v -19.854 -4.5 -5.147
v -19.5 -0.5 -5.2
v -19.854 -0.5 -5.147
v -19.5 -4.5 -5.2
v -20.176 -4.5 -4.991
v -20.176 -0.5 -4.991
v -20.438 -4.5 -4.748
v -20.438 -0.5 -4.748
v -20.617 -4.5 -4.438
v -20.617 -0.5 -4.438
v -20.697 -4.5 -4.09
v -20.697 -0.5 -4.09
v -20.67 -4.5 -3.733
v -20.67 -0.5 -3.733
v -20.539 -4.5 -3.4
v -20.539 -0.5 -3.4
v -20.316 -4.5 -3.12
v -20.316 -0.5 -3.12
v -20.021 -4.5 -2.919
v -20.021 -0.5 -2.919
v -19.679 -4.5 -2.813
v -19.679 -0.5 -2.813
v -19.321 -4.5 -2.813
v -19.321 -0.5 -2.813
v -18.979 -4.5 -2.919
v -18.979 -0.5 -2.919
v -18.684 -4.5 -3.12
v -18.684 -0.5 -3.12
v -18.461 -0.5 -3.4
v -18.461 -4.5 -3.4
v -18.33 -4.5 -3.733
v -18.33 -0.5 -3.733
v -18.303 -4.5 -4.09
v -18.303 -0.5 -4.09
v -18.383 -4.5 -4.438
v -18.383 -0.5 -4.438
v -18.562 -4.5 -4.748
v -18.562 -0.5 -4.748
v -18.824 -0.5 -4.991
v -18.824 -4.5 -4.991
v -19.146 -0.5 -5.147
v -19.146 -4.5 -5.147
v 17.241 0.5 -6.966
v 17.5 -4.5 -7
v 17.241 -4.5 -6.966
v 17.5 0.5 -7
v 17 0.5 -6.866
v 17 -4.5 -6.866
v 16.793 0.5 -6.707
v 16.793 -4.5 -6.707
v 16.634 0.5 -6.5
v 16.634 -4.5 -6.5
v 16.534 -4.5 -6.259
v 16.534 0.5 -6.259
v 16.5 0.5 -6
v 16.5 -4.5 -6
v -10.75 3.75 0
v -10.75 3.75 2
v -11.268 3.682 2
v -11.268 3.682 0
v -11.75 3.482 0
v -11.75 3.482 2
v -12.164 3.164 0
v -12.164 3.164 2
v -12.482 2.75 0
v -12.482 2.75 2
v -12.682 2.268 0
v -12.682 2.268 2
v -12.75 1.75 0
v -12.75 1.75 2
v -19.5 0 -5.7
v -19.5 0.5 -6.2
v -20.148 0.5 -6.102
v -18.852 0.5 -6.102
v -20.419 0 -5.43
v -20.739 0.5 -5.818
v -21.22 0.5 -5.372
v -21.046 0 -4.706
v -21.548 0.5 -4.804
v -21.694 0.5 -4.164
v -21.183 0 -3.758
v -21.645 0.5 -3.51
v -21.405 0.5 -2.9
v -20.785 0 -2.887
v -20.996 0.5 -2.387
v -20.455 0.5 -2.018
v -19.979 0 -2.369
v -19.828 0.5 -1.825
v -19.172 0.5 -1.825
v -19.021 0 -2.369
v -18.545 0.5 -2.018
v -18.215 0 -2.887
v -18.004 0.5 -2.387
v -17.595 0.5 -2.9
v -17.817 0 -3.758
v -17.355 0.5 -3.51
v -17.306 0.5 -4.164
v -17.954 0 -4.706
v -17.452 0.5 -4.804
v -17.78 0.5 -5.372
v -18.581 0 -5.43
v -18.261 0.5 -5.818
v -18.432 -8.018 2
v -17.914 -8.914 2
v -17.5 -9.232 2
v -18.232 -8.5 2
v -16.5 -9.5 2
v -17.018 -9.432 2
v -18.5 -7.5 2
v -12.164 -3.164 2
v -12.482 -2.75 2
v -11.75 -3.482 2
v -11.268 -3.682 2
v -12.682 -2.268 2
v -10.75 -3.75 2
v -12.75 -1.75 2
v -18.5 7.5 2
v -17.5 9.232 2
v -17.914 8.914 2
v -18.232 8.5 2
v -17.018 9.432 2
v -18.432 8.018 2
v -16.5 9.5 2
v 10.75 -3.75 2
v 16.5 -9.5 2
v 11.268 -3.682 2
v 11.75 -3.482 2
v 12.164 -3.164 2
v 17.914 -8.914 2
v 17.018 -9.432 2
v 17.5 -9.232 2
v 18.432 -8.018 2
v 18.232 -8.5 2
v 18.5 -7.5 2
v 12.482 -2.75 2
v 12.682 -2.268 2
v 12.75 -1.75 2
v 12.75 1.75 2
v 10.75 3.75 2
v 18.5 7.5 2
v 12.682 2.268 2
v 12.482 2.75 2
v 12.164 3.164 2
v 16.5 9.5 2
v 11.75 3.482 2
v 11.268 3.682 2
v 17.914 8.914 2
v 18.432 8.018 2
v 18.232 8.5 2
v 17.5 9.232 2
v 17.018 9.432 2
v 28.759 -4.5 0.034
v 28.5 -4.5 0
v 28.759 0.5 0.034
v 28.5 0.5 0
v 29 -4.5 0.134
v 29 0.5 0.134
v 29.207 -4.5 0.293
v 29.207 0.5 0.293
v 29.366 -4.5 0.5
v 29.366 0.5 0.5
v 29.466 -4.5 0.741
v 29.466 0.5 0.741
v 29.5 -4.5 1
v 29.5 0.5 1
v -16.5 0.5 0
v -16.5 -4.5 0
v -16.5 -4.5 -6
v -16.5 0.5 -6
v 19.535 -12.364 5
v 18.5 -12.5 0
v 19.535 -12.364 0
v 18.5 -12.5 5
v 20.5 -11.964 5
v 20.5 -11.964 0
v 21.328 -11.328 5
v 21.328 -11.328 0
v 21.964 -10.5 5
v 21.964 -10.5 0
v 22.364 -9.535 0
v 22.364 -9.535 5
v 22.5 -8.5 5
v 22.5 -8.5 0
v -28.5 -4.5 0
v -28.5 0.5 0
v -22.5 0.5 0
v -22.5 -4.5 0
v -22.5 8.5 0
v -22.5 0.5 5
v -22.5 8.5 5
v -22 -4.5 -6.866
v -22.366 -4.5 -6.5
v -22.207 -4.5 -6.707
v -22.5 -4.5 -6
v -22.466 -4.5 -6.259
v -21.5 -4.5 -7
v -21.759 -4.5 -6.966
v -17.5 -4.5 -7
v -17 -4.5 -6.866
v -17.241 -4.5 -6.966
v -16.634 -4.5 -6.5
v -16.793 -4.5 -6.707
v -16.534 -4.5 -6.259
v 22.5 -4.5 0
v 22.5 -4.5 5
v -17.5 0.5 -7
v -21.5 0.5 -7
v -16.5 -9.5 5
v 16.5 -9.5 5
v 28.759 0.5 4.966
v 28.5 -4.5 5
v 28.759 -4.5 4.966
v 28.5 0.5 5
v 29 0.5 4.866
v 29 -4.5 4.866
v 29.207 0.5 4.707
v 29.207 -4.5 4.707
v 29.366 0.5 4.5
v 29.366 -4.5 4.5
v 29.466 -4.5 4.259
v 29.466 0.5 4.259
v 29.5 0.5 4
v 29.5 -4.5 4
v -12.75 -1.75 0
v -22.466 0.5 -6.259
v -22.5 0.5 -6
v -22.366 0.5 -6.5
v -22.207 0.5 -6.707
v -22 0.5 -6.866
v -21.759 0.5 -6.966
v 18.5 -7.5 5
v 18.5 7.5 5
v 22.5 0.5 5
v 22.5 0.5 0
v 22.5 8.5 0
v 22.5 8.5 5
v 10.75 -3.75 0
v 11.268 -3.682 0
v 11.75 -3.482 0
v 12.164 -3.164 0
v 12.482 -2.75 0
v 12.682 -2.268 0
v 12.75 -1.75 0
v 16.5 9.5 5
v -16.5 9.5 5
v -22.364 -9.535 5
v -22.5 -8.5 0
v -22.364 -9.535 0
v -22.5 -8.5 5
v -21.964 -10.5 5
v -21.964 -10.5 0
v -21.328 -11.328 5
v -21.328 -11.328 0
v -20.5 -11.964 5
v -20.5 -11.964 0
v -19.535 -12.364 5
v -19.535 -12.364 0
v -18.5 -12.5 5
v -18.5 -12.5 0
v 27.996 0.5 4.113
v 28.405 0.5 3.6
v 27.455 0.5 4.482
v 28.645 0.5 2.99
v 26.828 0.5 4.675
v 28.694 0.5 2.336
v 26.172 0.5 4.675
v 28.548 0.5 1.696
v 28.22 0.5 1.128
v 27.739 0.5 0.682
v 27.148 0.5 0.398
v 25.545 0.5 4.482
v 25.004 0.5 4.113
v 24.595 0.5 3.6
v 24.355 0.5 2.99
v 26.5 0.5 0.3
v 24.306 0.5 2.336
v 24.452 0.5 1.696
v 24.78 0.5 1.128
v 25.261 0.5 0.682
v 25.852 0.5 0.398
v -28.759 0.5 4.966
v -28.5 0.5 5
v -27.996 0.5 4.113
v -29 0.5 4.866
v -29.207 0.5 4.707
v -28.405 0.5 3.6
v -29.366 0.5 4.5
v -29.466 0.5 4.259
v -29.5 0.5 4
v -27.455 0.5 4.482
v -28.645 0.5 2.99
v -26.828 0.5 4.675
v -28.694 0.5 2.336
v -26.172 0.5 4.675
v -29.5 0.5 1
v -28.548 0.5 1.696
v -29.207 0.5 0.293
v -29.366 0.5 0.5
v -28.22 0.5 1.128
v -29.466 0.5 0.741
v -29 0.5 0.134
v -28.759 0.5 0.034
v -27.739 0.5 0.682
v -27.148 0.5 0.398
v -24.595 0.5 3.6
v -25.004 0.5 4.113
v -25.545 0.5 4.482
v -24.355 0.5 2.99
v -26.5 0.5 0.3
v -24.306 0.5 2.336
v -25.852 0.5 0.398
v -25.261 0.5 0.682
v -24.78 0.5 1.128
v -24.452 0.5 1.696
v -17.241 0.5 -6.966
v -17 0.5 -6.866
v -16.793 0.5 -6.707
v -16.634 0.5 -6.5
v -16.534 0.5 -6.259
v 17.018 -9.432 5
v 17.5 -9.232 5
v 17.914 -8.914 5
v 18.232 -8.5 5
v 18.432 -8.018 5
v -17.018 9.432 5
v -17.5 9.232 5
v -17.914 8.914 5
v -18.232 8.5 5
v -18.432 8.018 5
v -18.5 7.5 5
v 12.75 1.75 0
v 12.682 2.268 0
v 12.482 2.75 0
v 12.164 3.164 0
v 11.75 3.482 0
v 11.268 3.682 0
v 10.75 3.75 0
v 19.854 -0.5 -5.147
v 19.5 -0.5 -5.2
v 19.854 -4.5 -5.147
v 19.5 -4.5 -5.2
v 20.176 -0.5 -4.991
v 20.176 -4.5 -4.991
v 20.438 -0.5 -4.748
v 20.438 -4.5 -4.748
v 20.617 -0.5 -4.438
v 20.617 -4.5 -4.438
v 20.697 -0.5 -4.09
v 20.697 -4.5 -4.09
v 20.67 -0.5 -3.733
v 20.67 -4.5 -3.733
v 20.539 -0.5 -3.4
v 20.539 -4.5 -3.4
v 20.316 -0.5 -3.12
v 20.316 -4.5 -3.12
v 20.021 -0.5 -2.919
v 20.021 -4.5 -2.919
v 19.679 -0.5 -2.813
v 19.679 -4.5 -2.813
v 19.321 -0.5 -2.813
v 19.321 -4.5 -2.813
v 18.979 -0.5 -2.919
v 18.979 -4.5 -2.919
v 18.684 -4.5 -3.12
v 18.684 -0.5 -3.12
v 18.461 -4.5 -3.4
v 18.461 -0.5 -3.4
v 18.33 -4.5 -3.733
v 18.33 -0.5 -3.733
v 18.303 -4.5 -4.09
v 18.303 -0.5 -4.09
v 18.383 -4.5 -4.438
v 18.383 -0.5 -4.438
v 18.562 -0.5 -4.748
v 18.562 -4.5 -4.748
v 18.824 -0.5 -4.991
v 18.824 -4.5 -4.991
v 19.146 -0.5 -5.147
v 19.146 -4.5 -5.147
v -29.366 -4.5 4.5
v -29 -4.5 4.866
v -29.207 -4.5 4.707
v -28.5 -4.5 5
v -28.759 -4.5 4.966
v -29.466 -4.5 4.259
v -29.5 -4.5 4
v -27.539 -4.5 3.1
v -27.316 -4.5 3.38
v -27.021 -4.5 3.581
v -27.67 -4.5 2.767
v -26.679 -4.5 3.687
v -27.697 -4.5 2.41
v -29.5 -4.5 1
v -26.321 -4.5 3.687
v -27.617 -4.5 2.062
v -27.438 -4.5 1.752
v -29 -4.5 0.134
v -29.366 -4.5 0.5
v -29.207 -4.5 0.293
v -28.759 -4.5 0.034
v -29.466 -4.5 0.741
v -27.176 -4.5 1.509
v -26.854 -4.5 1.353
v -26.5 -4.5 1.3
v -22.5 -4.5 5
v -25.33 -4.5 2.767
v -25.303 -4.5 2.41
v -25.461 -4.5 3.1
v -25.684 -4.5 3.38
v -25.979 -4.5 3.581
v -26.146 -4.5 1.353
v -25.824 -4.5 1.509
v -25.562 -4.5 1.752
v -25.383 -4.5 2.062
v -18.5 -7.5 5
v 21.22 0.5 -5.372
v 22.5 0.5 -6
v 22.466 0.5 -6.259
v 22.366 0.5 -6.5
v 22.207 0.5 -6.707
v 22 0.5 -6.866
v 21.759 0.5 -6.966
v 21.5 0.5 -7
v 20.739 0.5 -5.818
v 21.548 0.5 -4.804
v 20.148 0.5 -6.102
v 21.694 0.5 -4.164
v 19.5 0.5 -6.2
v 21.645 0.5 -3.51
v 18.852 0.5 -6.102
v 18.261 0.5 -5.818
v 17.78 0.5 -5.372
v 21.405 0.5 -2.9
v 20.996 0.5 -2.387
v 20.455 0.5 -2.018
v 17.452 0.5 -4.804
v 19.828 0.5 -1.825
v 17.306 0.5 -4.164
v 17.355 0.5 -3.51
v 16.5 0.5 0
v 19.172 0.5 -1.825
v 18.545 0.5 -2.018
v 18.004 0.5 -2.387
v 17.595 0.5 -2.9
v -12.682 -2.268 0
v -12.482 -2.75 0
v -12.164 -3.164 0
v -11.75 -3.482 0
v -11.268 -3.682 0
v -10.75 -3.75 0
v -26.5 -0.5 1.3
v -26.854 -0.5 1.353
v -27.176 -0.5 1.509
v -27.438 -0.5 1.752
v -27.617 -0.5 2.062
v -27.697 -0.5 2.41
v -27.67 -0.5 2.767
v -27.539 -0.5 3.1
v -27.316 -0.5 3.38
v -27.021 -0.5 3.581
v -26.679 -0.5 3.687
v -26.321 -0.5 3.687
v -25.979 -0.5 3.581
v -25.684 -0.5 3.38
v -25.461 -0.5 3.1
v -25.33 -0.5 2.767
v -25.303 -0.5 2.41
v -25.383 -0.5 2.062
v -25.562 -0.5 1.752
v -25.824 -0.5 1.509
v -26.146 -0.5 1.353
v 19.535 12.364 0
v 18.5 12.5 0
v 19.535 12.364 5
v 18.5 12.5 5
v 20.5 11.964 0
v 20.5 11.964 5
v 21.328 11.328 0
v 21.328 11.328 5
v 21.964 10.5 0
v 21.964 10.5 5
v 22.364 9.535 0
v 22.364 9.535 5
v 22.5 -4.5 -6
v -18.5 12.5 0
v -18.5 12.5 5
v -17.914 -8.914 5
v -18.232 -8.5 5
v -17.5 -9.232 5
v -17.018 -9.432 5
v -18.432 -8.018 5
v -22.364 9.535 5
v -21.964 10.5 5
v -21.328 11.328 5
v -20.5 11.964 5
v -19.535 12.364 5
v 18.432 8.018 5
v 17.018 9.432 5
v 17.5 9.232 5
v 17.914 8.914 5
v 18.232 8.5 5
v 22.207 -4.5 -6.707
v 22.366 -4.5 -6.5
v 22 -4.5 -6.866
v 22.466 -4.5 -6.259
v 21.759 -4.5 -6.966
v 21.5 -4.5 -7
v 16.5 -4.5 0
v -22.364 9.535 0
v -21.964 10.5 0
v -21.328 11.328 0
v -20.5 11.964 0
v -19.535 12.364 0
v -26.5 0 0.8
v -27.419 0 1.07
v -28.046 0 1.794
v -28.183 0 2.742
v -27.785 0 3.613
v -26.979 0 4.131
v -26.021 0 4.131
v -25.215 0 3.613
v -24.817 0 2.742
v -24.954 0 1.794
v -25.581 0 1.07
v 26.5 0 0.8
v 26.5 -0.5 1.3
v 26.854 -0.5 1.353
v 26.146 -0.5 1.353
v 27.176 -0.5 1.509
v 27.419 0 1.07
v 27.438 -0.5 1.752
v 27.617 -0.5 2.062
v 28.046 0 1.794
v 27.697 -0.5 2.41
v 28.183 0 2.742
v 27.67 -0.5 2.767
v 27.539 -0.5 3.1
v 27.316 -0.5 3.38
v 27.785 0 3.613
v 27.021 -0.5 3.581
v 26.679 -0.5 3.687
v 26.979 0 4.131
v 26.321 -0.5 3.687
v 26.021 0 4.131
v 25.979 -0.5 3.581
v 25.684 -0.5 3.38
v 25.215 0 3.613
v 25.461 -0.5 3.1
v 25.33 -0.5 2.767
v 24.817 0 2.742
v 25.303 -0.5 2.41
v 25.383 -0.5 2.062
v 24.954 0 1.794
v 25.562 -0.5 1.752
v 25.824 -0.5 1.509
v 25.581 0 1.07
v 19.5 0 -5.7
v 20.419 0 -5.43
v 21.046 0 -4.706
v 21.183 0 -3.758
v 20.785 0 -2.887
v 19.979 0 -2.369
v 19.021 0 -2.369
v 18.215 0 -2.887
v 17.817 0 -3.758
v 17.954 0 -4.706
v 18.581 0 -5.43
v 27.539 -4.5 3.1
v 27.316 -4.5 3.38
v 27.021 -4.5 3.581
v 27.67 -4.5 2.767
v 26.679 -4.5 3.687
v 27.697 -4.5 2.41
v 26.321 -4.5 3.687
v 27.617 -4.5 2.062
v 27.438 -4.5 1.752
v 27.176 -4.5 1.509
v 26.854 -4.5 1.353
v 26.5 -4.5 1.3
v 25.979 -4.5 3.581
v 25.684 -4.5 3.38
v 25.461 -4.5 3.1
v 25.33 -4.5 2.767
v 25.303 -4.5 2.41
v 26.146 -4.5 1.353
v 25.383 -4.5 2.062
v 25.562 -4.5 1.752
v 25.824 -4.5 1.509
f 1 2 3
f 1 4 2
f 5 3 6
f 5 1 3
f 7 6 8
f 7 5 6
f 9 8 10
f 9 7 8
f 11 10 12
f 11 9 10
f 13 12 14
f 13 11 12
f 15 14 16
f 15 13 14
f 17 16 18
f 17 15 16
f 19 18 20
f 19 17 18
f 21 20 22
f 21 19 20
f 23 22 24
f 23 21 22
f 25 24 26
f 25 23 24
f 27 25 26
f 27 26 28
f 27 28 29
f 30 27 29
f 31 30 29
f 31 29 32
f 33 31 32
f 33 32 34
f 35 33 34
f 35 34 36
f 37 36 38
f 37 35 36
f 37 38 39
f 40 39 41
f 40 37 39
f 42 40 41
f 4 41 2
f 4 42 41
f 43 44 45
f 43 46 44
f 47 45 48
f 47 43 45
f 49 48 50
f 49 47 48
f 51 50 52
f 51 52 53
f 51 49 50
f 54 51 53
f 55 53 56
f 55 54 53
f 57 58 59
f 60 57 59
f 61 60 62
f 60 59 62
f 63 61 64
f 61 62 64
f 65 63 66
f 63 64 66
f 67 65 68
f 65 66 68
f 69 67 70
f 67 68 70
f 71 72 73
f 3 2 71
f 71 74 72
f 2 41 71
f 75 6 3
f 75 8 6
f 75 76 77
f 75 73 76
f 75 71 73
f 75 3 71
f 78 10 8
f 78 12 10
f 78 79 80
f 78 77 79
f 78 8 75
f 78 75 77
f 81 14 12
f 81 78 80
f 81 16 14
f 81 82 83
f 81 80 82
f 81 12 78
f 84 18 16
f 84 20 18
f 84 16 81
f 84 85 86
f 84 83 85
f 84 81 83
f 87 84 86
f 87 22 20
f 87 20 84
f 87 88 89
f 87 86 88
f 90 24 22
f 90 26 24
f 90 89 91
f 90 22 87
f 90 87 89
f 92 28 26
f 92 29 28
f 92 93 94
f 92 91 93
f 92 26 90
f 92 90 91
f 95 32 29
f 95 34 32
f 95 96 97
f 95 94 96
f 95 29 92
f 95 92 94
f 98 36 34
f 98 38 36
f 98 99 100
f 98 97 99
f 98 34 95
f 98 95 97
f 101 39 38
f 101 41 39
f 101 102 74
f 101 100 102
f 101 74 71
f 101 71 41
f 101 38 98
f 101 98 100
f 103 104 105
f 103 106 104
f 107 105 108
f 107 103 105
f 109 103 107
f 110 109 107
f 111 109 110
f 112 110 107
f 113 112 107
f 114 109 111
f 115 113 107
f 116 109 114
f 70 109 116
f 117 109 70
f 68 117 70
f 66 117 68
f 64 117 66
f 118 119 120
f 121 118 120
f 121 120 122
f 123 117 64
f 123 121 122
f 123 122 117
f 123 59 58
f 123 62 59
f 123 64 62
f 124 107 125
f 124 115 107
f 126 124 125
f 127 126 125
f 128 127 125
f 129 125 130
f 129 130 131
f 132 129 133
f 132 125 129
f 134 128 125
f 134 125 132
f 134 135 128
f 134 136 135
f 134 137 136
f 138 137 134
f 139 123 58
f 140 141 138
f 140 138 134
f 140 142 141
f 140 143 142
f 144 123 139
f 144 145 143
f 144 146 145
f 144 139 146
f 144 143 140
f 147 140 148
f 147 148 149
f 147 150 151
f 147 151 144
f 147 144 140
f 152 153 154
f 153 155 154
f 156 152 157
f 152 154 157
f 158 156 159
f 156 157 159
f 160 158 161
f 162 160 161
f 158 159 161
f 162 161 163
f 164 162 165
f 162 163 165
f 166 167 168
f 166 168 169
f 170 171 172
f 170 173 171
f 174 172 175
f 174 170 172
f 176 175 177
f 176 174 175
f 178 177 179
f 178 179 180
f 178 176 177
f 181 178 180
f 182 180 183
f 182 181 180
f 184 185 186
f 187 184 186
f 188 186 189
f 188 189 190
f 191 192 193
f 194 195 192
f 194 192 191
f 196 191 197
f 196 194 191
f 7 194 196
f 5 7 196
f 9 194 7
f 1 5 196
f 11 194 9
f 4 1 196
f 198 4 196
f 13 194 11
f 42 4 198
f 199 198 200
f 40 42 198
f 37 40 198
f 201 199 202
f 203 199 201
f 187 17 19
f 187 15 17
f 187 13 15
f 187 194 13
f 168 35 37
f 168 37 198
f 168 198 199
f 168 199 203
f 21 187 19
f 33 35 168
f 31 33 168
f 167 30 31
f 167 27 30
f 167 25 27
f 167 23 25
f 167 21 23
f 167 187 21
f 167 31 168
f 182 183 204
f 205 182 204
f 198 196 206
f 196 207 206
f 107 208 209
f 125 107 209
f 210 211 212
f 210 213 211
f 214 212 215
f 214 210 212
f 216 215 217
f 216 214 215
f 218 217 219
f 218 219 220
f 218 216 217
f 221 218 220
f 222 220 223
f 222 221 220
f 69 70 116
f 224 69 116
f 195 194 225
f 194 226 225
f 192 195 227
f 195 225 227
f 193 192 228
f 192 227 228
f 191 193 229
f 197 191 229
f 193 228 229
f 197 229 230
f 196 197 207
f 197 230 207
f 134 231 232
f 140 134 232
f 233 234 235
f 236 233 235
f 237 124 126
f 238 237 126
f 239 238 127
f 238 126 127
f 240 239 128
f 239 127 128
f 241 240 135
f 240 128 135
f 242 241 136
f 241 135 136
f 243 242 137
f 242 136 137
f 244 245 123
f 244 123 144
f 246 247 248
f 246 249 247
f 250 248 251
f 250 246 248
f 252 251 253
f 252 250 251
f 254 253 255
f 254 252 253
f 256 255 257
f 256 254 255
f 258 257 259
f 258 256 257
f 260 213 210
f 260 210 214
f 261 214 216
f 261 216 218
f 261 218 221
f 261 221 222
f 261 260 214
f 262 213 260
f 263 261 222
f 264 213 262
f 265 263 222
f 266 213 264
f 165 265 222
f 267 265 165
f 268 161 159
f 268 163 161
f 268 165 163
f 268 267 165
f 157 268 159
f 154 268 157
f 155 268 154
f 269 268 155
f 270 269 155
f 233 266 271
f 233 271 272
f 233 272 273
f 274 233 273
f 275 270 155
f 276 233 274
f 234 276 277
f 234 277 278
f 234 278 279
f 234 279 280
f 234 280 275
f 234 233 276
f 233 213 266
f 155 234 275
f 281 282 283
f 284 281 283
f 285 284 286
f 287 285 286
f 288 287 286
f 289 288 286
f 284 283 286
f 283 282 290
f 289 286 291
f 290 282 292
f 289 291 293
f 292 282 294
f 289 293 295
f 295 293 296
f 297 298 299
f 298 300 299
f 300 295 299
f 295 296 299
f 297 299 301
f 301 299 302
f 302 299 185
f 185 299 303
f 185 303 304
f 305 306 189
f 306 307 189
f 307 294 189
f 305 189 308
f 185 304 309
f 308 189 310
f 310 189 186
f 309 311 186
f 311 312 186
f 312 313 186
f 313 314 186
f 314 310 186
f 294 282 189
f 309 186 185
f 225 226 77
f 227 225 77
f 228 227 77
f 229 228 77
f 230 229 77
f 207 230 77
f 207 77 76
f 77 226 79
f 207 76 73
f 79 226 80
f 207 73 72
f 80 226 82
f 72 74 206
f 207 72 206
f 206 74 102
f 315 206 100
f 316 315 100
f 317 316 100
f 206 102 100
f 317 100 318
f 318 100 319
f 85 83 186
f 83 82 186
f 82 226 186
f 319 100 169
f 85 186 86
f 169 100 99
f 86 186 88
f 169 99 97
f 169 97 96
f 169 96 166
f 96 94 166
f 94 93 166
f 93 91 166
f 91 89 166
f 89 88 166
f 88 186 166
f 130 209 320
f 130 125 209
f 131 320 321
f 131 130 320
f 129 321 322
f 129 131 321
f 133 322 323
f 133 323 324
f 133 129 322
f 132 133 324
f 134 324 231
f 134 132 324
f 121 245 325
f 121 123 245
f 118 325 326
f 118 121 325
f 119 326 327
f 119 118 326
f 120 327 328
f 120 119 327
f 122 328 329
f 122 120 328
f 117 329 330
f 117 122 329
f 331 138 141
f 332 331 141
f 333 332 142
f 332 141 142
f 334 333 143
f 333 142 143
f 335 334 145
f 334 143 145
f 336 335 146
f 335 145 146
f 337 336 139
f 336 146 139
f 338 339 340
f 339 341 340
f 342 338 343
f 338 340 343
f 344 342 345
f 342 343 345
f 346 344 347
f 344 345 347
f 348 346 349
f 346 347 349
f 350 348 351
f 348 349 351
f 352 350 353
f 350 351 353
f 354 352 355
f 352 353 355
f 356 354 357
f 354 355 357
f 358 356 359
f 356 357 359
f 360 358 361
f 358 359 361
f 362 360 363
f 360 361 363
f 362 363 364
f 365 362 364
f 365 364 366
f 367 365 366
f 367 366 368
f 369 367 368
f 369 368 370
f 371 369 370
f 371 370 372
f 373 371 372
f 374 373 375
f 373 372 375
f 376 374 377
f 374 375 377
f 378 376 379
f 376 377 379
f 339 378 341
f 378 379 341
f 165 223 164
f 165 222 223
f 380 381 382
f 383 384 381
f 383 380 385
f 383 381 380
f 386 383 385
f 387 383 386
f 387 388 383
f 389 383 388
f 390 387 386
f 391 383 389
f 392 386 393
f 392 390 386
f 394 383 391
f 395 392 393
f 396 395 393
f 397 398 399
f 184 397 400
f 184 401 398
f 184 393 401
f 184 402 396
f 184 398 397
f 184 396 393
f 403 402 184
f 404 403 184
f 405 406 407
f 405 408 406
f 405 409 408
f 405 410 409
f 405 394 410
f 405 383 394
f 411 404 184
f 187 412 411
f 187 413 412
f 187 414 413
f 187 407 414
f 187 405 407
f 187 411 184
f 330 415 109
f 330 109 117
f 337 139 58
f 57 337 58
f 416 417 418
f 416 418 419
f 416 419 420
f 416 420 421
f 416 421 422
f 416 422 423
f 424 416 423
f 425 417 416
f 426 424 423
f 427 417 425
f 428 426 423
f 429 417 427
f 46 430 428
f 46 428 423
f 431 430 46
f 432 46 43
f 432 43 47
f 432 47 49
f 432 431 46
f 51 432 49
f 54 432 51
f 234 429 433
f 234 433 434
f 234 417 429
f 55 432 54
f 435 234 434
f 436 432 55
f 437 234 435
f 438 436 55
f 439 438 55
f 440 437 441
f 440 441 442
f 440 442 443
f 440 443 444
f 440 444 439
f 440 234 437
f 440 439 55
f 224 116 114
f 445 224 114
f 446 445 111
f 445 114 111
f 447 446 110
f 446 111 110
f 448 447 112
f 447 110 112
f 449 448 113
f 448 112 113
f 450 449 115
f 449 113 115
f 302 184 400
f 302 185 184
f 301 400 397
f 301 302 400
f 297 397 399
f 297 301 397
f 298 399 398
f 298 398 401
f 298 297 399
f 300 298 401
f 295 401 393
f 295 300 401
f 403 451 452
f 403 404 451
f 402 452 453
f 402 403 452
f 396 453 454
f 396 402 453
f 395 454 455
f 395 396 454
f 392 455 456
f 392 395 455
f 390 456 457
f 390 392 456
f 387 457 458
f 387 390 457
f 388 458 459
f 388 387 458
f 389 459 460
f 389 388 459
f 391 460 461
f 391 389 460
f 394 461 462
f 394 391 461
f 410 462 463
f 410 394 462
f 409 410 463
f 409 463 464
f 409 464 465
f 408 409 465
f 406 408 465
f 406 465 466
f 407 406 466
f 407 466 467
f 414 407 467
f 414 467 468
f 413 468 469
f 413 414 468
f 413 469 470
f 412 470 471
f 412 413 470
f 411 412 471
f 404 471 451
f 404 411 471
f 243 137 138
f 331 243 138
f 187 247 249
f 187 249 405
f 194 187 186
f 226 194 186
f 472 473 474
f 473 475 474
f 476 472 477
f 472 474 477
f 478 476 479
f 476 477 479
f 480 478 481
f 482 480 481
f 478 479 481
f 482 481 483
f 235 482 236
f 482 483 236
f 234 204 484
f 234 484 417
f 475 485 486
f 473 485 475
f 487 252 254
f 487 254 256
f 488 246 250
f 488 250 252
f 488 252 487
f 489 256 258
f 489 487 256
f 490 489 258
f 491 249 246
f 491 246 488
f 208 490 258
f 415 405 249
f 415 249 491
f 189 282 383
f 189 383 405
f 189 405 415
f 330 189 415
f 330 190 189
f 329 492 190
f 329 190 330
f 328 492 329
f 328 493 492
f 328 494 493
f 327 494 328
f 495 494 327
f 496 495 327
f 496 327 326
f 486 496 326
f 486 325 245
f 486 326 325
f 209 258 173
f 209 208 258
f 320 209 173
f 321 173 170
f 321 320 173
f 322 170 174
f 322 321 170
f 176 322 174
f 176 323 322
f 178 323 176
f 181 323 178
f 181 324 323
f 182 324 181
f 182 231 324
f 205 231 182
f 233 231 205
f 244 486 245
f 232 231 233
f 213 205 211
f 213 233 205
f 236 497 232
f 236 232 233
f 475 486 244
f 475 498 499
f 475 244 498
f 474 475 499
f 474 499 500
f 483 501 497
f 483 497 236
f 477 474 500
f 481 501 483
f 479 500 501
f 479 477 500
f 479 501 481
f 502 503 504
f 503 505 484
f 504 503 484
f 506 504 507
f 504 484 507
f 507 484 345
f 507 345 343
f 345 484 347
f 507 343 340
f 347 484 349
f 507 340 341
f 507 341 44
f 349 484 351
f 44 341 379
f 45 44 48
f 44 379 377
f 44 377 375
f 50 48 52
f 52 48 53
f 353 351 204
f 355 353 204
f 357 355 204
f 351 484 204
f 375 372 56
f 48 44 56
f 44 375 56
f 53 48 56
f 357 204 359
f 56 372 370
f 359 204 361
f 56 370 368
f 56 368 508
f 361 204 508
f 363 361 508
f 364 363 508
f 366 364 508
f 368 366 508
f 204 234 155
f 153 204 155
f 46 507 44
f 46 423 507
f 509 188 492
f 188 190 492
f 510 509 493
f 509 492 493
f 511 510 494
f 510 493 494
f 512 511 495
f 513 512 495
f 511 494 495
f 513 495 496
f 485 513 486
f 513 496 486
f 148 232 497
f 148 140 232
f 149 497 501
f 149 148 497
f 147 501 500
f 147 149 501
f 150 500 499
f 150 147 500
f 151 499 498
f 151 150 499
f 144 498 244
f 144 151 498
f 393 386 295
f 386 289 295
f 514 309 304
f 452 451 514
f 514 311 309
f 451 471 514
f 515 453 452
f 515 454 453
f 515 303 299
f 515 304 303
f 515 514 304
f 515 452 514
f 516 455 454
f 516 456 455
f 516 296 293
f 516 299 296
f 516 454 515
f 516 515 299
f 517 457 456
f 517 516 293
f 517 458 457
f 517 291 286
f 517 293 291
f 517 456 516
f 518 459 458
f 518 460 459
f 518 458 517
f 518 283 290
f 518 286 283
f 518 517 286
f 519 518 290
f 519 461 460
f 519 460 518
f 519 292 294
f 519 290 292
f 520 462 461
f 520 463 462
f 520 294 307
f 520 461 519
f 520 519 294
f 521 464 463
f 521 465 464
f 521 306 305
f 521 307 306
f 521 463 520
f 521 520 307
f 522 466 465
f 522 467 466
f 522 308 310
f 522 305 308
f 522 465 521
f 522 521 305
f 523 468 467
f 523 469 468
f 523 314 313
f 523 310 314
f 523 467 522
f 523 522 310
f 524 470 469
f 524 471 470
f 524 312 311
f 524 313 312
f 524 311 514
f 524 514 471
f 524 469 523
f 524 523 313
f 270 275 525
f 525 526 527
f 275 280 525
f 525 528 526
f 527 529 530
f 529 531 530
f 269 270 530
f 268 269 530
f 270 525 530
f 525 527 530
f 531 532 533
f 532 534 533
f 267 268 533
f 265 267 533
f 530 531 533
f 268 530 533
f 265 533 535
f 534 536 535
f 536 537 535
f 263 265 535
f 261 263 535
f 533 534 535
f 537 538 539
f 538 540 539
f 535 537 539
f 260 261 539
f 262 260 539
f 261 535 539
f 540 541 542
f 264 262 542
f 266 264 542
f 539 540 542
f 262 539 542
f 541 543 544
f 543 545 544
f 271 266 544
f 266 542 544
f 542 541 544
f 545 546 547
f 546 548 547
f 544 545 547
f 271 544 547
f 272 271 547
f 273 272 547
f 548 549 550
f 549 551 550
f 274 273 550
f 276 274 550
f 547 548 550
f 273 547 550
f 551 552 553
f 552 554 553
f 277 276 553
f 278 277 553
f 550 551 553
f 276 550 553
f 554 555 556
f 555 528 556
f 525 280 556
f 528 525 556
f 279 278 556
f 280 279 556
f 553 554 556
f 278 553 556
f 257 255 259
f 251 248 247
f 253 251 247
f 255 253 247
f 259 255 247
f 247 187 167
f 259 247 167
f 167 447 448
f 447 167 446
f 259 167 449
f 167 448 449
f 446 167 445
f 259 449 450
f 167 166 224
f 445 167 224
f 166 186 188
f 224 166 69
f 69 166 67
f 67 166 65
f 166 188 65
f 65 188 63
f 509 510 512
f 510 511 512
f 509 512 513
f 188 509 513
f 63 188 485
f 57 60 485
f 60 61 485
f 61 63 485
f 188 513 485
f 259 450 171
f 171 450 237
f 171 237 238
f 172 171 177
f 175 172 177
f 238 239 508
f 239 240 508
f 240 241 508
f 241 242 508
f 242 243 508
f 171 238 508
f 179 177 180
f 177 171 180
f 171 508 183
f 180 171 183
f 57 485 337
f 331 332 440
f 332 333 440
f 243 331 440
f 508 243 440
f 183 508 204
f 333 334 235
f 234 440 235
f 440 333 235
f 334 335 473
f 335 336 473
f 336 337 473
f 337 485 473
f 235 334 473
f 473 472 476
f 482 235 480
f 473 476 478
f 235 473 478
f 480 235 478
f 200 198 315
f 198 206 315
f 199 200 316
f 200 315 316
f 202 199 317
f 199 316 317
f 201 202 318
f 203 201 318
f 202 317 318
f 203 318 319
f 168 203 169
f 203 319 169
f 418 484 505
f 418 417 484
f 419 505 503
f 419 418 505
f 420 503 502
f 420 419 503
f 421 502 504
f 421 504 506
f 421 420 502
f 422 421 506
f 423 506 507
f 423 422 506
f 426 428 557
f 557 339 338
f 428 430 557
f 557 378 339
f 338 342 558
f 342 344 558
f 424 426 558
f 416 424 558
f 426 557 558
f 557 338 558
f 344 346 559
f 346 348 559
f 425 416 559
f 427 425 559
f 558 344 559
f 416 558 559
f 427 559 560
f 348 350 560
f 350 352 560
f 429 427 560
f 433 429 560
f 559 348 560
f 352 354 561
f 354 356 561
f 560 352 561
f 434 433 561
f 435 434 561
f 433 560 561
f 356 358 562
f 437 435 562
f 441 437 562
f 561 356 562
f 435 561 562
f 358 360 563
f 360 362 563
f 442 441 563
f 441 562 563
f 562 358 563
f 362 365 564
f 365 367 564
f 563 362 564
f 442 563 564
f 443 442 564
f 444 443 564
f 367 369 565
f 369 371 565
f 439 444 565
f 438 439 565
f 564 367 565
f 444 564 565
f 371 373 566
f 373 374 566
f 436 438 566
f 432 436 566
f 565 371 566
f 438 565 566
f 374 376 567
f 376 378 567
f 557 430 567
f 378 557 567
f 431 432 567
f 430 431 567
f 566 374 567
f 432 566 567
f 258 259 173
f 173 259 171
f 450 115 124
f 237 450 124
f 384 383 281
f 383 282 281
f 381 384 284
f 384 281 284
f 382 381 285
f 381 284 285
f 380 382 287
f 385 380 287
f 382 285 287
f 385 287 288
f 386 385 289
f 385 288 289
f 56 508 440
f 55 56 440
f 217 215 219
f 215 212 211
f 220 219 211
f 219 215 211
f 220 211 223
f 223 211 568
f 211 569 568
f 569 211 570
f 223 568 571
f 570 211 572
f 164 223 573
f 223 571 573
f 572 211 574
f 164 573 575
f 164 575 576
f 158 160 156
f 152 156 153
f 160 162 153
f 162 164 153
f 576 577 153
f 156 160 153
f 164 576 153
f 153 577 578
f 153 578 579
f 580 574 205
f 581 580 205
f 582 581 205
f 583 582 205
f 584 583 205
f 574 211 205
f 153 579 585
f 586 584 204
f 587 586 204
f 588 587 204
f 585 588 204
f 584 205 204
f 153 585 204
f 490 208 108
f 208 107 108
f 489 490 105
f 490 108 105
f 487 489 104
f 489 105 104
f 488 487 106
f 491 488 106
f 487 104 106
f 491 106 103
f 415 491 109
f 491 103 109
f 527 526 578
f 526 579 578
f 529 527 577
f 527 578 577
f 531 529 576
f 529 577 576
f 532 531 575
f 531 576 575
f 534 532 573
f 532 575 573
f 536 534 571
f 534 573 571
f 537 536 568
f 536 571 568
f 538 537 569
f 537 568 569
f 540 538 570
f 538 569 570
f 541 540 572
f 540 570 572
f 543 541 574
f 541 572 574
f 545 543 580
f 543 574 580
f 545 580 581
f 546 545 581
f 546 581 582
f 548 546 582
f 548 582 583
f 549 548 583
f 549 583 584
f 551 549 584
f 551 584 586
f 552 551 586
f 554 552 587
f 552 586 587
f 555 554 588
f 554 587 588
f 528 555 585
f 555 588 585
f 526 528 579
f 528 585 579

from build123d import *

# Parameters (mm, degrees)
SKETCH1_W                                       = 45
SKETCH1_H                                       = 25
BOSS_EXTRUDE1_DEPTH                             = 5
SKETCH2_W                                       = 37
SKETCH2_H                                       = 19
CUT_EXTRUDE1_DEPTH                              = 3
FILLET1_R                                       = 2
CUT_EXTRUDE2_DEPTH                              = 26.91331704
FILLET2_R                                       = 4
SKETCH4_W                                       = 5
SKETCH4_H                                       = 5
BOSS_EXTRUDE2_DEPTH                             = 7
CSK_FOR_M2_FLAT_HEAD_MACHINE_SCREW1_D           = 2.4
CSK_FOR_M2_FLAT_HEAD_MACHINE_SCREW1_CSINK_D     = 4.4
CSK_FOR_M2_FLAT_HEAD_MACHINE_SCREW1_CSINK_ANGLE = 90
FILLET3_R                                       = 1
FILLET3_OF_MIRROR1_R                            = 1
SKETCH8_W                                       = 6
SKETCH8_H                                       = 5
BOSS_EXTRUDE3_DEPTH                             = 7
CSK_FOR_M2_FLAT_HEAD_MACHINE_SCREW2_D           = 2.4
CSK_FOR_M2_FLAT_HEAD_MACHINE_SCREW2_CSINK_D     = 4.4
CSK_FOR_M2_FLAT_HEAD_MACHINE_SCREW2_CSINK_ANGLE = 90
FILLET4_R                                       = 1
FILLET4_OF_MIRROR2_R                            = 1


with BuildPart() as part:
    # Sketch1 → Boss-Extrude1 (new body)
    with BuildSketch(Plane.XY):
        Rectangle(SKETCH1_W, SKETCH1_H)
    extrude(amount=BOSS_EXTRUDE1_DEPTH)

    # Sketch2 → Cut-Extrude1 (cut)
    with BuildSketch(Plane.XY.offset(5)):
        Rectangle(SKETCH2_W, SKETCH2_H)
    extrude(amount=-CUT_EXTRUDE1_DEPTH, mode=Mode.SUBTRACT)

    # Fillet1
    fillet1_edges = [part.edges().sort_by_distance(p)[0] for p in [
        (18.5, 9.5, 3.5),
        (18.5, -9.5, 3.5),
        (-18.5, -9.5, 3.5),
        (-18.5, 9.5, 3.5),
    ]]
    fillet(fillet1_edges, radius=FILLET1_R)

    # Sketch3 → Cut-Extrude2 (cut, through all)
    with BuildSketch(Plane.XY.offset(2)):
        with BuildLine():
            Line((-10.75, -3.75), (10.75, -3.75))
            ThreePointArc((10.75, -3.75), (12.164213562, -3.164213562), (12.75, -1.75))
            Line((12.75, -1.75), (12.75, 1.75))
            ThreePointArc((12.75, 1.75), (12.164213562, 3.164213562), (10.75, 3.75))
            Line((10.75, 3.75), (-10.75, 3.75))
            ThreePointArc((-10.75, 3.75), (-12.164213562, 3.164213562), (-12.75, 1.75))
            Line((-12.75, 1.75), (-12.75, -1.75))
            ThreePointArc((-12.75, -1.75), (-12.164213562, -3.164213562), (-10.75, -3.75))
        make_face()
    extrude(amount=-CUT_EXTRUDE2_DEPTH, mode=Mode.SUBTRACT)

    # Fillet2
    fillet2_edges = [part.edges().sort_by_distance(p)[0] for p in [
        (22.5, -12.5, 2.5),
        (-22.5, -12.5, 2.5),
        (-22.5, 12.5, 2.5),
        (22.5, 12.5, 2.5),
    ]]
    fillet(fillet2_edges, radius=FILLET2_R)

    # Sketch4 → Boss-Extrude2 (add)
    with BuildSketch(Plane(origin=(22.5, 0, 0), x_dir=(0, 0, -1), z_dir=(1, 0, 0))):
        with Locations((-2.5, -2)):
            Rectangle(SKETCH4_W, SKETCH4_H)
    boss_extrude2 = extrude(amount=BOSS_EXTRUDE2_DEPTH)

    # CSK for M2 Flat Head Machine Screw1 (through all)
    with Locations(Plane(origin=(26.5, 0.5, 2.5), x_dir=(0, 0, 1), z_dir=(0, 1, 0))):
        with Locations((0, 0)):
            csk_for_m2_flat_head_machine_screw1 = CounterSinkHole(CSK_FOR_M2_FLAT_HEAD_MACHINE_SCREW1_D / 2, CSK_FOR_M2_FLAT_HEAD_MACHINE_SCREW1_CSINK_D / 2, counter_sink_angle=CSK_FOR_M2_FLAT_HEAD_MACHINE_SCREW1_CSINK_ANGLE)

    # Fillet3
    fillet3_edges = [part.edges().sort_by_distance(p)[0] for p in [
        (29.5, -2, 5),
        (29.5, -2, 0),
    ]]
    fillet(fillet3_edges, radius=FILLET3_R)

    # Mirror1: Boss-Extrude2, CSK for M2 Flat Head Machine Screw1 across plane
    add(boss_extrude2.mirror(Plane(origin=(0, 0, 0), x_dir=(0, 0, 1), z_dir=(1, 0, 0))))
    add(csk_for_m2_flat_head_machine_screw1.mirror(Plane(origin=(0, 0, 0), x_dir=(0, 0, 1), z_dir=(1, 0, 0))), mode=Mode.SUBTRACT)

    # Fillet3 of Mirror1
    fillet3_of_mirror1_edges = [part.edges().sort_by_distance(p)[0] for p in [
        (-29.5, -2, 5),
        (-29.5, -2, 0),
    ]]
    fillet(fillet3_of_mirror1_edges, radius=FILLET3_OF_MIRROR1_R)

    # Sketch8 → Boss-Extrude3 (add)
    with BuildSketch(Plane(origin=(0, 0, 0), x_dir=(-1, 0, 0), z_dir=(0, 0, -1))):
        with Locations((-19.5, -2)):
            Rectangle(SKETCH8_W, SKETCH8_H)
    boss_extrude3 = extrude(amount=BOSS_EXTRUDE3_DEPTH)

    # CSK for M2 Flat Head Machine Screw2 (through all)
    with Locations(Plane(origin=(19.5, 0.5, -4), x_dir=(0, 0, 1), z_dir=(0, 1, 0))):
        with Locations((0, 0)):
            csk_for_m2_flat_head_machine_screw2 = CounterSinkHole(CSK_FOR_M2_FLAT_HEAD_MACHINE_SCREW2_D / 2, CSK_FOR_M2_FLAT_HEAD_MACHINE_SCREW2_CSINK_D / 2, counter_sink_angle=CSK_FOR_M2_FLAT_HEAD_MACHINE_SCREW2_CSINK_ANGLE)

    # Fillet4
    fillet4_edges = [part.edges().sort_by_distance(p)[0] for p in [
        (22.5, -2, -7),
        (16.5, -2, -7),
    ]]
    fillet(fillet4_edges, radius=FILLET4_R)

    # Mirror2: Boss-Extrude3, CSK for M2 Flat Head Machine Screw2 across plane
    add(boss_extrude3.mirror(Plane(origin=(0, 0, 0), x_dir=(0, 0, 1), z_dir=(1, 0, 0))))
    add(csk_for_m2_flat_head_machine_screw2.mirror(Plane(origin=(0, 0, 0), x_dir=(0, 0, 1), z_dir=(1, 0, 0))), mode=Mode.SUBTRACT)

    # Fillet4 of Mirror2
    fillet4_of_mirror2_edges = [part.edges().sort_by_distance(p)[0] for p in [
        (-22.5, -2, -7),
        (-16.5, -2, -7),
    ]]
    fillet(fillet4_of_mirror2_edges, radius=FILLET4_OF_MIRROR2_R)


solid = part.part
